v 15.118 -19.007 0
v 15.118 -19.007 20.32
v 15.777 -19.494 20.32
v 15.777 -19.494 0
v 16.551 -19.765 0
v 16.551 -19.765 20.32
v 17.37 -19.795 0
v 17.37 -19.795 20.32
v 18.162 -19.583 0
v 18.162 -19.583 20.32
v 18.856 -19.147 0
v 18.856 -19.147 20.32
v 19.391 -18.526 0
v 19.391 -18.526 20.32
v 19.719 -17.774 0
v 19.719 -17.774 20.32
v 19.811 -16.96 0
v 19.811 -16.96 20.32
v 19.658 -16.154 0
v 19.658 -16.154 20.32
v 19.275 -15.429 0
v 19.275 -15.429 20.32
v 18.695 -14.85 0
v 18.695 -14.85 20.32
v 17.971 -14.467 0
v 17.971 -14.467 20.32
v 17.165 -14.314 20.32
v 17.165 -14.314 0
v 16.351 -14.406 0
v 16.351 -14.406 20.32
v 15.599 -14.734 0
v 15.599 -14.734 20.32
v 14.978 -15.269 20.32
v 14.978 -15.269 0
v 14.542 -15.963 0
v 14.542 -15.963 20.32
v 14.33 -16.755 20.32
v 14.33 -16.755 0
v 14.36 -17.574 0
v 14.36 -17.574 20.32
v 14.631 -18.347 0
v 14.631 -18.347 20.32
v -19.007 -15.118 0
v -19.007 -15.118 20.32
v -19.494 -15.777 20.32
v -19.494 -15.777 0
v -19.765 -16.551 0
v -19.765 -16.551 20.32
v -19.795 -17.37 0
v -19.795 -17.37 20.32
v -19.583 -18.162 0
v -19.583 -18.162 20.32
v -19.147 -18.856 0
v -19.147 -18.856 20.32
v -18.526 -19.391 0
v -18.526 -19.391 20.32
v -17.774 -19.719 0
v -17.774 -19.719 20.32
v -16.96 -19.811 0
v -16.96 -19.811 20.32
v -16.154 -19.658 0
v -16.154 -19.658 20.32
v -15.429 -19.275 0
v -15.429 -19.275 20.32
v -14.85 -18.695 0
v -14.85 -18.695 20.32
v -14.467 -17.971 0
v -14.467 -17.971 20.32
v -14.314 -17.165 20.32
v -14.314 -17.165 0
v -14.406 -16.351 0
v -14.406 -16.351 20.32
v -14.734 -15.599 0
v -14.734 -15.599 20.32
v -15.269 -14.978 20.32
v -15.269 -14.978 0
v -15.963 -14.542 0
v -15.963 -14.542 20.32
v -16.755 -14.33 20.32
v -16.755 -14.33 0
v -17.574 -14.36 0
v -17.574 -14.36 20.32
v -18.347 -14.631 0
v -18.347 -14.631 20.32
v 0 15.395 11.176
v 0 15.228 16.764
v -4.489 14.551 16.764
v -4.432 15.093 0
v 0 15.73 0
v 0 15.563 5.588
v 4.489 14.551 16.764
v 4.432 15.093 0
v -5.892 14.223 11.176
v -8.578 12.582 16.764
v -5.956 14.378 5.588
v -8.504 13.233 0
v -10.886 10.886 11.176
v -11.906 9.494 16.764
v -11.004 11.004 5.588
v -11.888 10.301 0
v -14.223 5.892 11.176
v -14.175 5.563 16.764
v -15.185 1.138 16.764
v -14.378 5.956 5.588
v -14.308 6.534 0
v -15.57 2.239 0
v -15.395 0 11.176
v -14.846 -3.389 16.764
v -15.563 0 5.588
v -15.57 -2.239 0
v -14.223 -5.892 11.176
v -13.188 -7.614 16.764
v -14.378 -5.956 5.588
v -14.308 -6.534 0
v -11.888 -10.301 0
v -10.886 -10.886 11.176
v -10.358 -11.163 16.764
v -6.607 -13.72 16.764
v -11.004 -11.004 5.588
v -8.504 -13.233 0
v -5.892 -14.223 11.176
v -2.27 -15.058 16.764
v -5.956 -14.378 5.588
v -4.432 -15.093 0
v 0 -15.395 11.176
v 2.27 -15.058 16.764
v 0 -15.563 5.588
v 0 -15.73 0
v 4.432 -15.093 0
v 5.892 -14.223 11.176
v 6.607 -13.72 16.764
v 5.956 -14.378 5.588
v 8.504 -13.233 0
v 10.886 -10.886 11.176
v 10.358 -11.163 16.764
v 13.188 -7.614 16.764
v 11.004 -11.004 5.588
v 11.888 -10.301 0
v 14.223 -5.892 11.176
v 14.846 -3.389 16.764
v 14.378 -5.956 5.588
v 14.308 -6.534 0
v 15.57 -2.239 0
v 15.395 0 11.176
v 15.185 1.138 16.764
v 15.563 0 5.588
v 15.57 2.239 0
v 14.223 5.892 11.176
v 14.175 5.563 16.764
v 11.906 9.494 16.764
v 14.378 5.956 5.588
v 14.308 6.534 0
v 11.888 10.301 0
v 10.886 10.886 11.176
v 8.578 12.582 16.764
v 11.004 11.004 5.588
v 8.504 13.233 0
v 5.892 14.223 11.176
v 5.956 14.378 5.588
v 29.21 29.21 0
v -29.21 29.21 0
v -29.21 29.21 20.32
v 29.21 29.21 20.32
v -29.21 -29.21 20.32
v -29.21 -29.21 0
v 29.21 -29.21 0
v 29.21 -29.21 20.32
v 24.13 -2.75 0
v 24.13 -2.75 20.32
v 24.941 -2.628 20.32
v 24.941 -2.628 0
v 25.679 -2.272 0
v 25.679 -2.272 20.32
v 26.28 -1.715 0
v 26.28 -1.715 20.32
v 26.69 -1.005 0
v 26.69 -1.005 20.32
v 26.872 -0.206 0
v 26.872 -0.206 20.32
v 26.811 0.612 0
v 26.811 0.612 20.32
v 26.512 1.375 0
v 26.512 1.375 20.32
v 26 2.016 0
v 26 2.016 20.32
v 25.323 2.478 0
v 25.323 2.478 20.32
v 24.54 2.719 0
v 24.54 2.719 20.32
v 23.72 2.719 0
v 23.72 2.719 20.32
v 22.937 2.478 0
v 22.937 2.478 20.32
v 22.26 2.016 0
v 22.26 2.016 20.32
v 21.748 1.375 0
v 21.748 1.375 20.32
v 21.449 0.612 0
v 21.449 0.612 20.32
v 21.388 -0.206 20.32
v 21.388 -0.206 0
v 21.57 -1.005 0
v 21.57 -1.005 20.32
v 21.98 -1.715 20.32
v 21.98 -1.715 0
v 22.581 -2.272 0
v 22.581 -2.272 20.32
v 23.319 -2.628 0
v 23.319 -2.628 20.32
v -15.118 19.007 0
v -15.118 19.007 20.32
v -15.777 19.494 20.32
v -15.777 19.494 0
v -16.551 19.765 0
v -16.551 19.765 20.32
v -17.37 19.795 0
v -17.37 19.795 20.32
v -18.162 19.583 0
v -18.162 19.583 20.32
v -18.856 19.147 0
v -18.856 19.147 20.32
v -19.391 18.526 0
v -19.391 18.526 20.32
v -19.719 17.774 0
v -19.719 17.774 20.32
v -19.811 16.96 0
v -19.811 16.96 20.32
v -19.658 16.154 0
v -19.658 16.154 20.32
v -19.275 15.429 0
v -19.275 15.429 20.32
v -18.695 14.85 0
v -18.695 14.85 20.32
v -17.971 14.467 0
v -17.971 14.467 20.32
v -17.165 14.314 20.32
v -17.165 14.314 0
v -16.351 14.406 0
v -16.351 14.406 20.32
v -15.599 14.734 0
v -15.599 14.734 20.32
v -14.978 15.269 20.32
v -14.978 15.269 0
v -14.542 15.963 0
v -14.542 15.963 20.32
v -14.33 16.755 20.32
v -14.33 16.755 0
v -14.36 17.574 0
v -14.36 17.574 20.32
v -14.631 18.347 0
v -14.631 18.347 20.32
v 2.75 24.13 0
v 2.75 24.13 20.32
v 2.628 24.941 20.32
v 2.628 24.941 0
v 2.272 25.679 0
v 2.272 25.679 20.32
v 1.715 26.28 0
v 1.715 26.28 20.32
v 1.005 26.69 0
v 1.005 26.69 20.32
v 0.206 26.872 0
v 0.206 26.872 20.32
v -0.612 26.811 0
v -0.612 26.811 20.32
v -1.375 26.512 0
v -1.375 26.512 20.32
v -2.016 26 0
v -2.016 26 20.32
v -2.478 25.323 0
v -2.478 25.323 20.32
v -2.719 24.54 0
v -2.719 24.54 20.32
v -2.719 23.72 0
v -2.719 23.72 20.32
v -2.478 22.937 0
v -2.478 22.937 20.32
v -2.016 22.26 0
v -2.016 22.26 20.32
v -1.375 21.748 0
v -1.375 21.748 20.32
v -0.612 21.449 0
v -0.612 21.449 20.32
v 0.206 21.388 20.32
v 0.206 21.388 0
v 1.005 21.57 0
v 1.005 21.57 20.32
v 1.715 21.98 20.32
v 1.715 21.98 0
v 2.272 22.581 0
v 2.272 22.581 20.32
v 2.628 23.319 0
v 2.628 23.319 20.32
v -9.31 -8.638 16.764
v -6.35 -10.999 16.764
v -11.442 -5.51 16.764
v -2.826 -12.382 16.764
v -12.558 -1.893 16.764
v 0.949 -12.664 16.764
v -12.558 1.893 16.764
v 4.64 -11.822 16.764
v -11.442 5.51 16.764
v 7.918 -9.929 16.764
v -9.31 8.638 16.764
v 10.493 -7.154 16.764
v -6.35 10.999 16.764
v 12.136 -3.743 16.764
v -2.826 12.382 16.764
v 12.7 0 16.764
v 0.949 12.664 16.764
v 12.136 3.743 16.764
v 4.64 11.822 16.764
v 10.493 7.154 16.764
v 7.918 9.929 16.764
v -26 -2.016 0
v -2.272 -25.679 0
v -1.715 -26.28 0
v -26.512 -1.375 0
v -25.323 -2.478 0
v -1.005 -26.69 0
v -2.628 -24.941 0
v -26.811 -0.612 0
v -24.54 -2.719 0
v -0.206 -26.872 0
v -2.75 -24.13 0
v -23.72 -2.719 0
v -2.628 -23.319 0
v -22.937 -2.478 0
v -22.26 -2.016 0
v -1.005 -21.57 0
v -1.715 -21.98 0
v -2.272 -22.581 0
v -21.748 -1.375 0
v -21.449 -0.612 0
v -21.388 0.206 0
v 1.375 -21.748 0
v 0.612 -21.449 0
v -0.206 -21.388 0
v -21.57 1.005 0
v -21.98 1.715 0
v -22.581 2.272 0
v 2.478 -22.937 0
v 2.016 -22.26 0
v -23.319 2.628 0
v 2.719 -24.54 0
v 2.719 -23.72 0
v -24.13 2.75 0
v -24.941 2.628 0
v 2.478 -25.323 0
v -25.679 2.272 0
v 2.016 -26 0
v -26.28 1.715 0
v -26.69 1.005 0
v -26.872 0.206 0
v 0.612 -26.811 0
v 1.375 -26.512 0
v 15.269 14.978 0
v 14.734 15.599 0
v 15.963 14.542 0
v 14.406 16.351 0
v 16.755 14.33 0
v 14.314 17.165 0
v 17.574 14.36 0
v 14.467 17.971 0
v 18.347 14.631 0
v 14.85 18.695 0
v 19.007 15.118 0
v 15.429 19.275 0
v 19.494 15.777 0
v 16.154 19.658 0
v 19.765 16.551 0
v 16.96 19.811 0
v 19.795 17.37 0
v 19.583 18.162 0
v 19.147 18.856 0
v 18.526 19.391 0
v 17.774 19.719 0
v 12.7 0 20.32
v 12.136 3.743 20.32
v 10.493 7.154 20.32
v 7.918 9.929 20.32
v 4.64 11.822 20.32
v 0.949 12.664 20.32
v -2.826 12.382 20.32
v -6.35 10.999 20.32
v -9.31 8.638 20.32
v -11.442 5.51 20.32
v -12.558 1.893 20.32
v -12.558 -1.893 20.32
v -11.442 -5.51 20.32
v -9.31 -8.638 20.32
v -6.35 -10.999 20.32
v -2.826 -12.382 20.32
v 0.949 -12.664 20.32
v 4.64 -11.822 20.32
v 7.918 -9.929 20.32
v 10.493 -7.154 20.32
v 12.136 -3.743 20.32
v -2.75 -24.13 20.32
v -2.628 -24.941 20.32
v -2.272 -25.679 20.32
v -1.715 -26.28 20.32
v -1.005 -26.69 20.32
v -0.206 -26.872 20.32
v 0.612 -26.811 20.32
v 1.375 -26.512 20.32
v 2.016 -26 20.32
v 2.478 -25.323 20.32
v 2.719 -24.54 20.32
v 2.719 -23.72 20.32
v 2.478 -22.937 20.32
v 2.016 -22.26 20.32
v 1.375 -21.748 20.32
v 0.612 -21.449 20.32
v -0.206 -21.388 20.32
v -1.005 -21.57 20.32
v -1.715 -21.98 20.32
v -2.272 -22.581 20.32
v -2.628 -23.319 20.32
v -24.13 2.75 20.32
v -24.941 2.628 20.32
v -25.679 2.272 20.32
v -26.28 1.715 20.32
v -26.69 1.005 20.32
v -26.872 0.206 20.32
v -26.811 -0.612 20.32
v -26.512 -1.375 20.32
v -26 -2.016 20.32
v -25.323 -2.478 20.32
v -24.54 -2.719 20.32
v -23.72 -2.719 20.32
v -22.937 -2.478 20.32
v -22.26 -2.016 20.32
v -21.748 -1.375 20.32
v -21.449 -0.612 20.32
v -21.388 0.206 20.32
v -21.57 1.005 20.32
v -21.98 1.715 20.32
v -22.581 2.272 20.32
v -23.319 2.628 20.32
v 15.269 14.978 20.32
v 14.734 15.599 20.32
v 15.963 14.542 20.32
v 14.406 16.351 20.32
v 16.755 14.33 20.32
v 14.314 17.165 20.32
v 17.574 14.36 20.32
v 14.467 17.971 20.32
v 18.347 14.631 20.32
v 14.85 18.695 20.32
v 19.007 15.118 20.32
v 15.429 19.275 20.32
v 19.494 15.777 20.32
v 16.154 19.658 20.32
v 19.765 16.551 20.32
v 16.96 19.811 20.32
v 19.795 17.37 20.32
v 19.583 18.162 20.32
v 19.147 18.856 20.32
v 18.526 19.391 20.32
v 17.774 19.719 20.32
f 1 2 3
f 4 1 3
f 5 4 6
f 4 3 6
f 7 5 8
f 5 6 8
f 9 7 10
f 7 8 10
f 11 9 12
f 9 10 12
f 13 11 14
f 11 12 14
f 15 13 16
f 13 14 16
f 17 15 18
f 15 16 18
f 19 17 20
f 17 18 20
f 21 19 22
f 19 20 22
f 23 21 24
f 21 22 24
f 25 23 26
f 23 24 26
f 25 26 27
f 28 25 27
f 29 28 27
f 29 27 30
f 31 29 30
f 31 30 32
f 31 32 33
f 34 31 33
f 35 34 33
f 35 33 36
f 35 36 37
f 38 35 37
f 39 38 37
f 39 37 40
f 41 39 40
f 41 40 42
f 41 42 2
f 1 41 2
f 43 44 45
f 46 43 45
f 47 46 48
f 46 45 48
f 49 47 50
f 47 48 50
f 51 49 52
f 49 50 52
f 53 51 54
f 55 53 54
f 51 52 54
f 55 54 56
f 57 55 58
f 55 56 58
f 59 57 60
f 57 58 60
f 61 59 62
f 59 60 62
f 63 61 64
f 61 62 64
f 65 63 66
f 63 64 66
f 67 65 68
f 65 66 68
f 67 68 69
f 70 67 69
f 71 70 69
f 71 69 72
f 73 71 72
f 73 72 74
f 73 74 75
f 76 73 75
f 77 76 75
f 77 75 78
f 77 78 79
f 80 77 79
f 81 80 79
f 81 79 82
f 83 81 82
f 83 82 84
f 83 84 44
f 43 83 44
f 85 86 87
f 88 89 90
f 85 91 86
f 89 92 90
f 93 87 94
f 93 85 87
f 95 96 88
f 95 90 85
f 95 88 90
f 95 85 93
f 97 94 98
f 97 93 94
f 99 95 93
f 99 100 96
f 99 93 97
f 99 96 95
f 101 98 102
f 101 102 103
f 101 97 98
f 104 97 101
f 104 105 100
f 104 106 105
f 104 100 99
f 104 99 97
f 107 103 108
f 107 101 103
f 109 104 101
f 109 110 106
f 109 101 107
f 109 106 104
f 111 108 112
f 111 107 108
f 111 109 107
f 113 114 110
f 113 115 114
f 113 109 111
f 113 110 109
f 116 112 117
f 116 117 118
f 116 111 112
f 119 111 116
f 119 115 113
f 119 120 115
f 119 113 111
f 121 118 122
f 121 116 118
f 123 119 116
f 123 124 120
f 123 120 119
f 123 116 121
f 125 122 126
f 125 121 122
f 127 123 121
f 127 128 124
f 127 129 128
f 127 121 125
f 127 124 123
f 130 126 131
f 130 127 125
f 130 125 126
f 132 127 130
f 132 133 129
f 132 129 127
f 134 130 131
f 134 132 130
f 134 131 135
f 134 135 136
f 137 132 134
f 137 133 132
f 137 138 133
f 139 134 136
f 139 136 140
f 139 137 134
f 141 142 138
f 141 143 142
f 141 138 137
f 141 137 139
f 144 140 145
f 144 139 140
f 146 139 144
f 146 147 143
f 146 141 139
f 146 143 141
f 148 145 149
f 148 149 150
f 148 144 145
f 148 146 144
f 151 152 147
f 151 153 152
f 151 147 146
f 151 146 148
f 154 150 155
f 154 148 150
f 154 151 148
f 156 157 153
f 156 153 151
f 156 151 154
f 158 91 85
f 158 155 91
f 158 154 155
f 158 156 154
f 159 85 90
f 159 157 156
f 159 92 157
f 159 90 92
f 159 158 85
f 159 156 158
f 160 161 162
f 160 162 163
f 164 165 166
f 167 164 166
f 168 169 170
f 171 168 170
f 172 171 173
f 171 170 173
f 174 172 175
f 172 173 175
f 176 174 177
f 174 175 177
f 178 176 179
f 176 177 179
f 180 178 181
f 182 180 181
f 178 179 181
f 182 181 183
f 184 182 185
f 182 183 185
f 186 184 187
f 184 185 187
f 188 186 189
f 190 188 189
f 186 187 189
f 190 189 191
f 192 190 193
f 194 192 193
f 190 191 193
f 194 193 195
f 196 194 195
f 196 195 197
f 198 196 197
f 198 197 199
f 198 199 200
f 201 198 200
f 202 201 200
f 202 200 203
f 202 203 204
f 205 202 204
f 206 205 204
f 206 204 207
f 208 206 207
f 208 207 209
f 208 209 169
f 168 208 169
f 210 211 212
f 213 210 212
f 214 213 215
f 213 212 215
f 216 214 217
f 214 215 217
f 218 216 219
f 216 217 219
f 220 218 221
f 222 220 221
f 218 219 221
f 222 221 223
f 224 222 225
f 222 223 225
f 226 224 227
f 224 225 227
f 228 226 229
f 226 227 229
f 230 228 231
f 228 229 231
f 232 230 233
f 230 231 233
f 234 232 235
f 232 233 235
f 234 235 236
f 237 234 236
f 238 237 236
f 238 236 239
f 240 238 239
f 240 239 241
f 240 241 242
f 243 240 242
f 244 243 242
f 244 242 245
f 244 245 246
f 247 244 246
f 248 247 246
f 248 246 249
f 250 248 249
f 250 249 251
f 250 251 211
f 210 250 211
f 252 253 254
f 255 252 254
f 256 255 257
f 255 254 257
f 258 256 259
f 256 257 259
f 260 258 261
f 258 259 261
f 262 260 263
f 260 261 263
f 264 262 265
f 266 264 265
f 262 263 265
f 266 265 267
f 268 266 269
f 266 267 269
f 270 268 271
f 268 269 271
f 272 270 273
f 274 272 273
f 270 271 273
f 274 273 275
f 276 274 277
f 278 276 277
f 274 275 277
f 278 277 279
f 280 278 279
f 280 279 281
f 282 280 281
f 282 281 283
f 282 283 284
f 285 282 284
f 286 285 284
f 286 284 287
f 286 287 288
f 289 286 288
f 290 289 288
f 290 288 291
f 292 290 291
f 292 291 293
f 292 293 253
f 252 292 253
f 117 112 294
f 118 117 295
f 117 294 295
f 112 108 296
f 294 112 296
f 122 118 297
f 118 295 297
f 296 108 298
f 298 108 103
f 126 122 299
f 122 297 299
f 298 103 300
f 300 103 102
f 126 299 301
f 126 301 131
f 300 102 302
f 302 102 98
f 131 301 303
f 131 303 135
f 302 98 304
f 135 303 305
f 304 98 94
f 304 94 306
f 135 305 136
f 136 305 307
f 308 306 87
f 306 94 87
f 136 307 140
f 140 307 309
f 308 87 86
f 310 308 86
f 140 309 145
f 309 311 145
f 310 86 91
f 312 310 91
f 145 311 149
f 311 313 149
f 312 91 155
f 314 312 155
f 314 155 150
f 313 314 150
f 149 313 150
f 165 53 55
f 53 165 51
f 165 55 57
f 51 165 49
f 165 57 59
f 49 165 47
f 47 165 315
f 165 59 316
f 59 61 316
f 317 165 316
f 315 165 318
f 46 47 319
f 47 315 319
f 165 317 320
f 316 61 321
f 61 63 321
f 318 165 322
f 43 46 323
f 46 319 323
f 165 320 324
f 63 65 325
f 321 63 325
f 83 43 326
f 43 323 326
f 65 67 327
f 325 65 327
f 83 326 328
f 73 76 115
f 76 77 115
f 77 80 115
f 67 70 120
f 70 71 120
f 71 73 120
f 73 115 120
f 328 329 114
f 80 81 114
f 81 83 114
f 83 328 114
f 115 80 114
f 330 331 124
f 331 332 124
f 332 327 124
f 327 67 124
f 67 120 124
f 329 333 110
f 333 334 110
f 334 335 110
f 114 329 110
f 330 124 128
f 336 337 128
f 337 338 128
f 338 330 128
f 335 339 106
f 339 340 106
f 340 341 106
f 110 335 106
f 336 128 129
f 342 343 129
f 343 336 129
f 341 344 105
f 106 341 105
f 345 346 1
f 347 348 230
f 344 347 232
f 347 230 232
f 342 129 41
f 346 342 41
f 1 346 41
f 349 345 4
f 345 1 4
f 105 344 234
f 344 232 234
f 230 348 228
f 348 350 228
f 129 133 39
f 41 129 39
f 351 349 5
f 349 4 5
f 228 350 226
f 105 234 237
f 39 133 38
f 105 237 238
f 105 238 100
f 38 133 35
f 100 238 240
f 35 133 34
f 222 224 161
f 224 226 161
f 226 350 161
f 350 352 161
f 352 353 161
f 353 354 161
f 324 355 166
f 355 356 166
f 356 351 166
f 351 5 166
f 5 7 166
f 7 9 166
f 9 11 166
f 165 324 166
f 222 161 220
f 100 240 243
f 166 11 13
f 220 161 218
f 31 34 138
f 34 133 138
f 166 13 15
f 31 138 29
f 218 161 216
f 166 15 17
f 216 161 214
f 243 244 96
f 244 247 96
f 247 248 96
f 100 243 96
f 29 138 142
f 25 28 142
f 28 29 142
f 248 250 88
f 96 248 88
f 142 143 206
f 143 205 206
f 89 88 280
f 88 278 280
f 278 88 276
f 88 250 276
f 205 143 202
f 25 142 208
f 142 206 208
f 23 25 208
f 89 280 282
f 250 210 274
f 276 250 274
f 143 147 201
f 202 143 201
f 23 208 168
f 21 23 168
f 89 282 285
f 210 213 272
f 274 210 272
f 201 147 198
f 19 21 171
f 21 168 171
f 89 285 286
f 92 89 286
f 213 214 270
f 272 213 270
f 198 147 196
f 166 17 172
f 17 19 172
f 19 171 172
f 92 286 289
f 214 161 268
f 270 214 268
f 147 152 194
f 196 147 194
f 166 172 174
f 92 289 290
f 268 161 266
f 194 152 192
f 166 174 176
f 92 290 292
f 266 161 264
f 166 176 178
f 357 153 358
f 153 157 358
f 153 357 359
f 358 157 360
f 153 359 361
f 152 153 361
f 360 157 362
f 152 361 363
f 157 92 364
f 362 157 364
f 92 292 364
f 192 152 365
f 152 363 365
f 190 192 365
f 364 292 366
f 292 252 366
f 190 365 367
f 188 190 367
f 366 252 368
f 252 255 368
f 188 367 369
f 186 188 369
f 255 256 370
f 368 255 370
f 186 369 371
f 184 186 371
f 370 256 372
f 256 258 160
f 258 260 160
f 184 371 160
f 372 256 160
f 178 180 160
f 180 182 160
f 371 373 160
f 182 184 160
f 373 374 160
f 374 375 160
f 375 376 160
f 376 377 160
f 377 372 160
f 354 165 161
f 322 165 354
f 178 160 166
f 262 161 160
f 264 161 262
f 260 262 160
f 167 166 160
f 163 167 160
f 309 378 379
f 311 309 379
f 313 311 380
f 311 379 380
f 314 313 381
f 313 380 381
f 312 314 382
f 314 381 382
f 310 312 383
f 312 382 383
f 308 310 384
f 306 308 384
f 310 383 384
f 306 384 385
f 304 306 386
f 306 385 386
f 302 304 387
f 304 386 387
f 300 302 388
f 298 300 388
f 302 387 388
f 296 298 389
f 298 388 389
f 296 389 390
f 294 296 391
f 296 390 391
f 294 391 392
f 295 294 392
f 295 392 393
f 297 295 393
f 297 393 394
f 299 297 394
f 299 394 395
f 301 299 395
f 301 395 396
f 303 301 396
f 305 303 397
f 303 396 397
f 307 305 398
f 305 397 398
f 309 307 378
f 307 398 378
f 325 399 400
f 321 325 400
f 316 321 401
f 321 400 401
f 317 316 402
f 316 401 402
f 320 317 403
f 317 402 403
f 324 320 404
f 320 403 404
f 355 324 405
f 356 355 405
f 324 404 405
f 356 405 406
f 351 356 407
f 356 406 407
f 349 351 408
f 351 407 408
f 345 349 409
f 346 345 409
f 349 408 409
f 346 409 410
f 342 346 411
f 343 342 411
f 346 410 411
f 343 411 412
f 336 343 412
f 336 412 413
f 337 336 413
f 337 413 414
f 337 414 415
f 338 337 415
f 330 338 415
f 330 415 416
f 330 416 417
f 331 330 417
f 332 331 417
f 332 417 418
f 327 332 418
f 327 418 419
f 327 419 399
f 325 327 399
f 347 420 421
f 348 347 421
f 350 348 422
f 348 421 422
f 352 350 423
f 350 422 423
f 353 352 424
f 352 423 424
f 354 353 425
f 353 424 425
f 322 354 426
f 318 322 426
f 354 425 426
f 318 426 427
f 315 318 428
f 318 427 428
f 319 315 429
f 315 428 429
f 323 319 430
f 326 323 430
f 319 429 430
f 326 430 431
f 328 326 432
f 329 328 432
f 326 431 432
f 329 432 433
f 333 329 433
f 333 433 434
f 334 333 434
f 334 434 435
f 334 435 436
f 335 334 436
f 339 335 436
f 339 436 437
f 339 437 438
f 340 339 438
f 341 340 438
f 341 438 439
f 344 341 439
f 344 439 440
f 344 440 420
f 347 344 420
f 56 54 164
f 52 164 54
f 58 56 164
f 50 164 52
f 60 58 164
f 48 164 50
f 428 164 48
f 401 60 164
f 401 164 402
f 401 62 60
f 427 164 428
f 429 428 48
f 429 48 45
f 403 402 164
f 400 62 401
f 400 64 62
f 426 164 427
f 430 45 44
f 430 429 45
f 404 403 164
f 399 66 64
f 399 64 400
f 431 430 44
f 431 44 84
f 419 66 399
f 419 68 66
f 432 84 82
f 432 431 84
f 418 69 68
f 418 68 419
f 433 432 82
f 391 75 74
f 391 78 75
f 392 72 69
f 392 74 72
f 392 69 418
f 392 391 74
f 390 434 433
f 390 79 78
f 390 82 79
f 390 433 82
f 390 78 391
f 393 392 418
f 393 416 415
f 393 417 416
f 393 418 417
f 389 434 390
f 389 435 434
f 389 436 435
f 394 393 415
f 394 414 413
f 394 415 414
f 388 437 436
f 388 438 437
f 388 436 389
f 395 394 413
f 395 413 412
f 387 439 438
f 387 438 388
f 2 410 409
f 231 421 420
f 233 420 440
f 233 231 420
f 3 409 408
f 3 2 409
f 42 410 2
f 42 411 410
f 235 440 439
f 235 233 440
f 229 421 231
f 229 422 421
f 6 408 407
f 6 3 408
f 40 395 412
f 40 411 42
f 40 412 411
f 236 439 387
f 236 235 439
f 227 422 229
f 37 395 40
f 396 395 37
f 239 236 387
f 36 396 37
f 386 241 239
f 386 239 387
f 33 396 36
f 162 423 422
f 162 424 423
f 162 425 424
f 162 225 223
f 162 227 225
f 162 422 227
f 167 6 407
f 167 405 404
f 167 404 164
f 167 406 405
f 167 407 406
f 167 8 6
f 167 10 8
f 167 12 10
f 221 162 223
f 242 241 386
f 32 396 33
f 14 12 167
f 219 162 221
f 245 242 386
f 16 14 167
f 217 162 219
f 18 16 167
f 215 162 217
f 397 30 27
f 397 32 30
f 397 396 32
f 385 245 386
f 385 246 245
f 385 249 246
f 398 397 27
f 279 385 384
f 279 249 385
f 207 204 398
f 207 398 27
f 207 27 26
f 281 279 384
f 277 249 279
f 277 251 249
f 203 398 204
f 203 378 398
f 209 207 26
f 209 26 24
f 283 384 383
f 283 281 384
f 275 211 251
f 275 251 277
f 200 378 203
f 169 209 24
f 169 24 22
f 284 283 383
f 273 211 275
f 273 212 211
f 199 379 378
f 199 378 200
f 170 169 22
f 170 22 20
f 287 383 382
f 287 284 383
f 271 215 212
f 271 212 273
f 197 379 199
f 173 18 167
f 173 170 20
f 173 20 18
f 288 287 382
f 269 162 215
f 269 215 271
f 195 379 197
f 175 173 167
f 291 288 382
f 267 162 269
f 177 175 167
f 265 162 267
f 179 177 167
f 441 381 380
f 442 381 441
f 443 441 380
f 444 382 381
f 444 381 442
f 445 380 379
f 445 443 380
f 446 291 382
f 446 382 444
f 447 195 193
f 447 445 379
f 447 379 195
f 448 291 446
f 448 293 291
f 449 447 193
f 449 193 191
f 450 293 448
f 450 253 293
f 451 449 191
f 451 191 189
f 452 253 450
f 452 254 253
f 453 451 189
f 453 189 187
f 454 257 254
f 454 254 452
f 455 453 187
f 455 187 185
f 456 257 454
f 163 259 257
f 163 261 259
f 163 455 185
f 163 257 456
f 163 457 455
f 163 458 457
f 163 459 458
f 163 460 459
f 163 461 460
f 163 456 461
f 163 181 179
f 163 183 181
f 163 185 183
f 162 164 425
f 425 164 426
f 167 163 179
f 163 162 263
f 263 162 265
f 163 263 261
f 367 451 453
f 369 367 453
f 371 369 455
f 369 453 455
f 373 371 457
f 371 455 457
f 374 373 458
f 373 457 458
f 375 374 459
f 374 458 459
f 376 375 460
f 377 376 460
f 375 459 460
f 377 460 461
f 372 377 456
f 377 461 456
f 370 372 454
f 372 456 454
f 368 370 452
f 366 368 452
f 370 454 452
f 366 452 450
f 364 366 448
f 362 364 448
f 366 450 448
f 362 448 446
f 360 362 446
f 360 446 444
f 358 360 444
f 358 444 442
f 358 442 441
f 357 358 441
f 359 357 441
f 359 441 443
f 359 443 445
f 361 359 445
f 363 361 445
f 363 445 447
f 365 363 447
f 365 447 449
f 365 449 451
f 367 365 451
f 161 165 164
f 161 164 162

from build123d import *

# Parameters (mm, degrees)
SKETCH1_W                = 58.42
SKETCH1_H                = 58.42
BOSS_EXTRUDE1_DEPTH      = 20.32
M5_CLEARANCE_HOLE1_D     = 5.5
M5_CLEARANCE_HOLE1_DEPTH = 20.32
CIRPATTERN1_COUNT        = 8
SKETCH9_R                = 14.4907
SKETCH9_R_2              = 12.7
BOSS_EXTRUDE2_DEPTH      = 3.556


with BuildPart() as part:
    # Sketch1 → Boss-Extrude1 (new body)
    with BuildSketch(Plane.XY):
        Rectangle(SKETCH1_W, SKETCH1_H)
    extrude(amount=BOSS_EXTRUDE1_DEPTH)

    # Sketch7 → 1 NPT Tapped Hole2 (revolve, cut)
    with BuildSketch(Plane.YZ):
        Polygon((0, 0), (0, 20.32), (14.4907, 20.32), (14.4907, 16.764), (15.22797859, 16.764), (15.7299152, 0), align=None)
    revolve(axis=Axis((0, 0, -6.35), (0, 0, 1)), mode=Mode.SUBTRACT)

    # M5 Clearance Hole1
    with Locations(Plane(origin=(0, 0, 0), x_dir=(-1, 0, 0), z_dir=(0, 0, -1))):
        with Locations((0, 24.13)):
            m5_clearance_hole1 = Hole(M5_CLEARANCE_HOLE1_D / 2, depth=M5_CLEARANCE_HOLE1_DEPTH)

    # CirPattern1: M5 Clearance Hole1 ×8 about axis
    cirpattern1_axis = Axis((0, 0, 0), (0, 0, 1))
    for i in range(1, CIRPATTERN1_COUNT):
        add(m5_clearance_hole1.rotate(cirpattern1_axis, i * 360 / CIRPATTERN1_COUNT), mode=Mode.SUBTRACT)

    # Sketch9 → Boss-Extrude2 (add)
    with BuildSketch(Plane.XY.offset(20.32)):
        Circle(SKETCH9_R)
        Circle(SKETCH9_R_2, mode=Mode.SUBTRACT)
    extrude(amount=-BOSS_EXTRUDE2_DEPTH)


solid = part.part
